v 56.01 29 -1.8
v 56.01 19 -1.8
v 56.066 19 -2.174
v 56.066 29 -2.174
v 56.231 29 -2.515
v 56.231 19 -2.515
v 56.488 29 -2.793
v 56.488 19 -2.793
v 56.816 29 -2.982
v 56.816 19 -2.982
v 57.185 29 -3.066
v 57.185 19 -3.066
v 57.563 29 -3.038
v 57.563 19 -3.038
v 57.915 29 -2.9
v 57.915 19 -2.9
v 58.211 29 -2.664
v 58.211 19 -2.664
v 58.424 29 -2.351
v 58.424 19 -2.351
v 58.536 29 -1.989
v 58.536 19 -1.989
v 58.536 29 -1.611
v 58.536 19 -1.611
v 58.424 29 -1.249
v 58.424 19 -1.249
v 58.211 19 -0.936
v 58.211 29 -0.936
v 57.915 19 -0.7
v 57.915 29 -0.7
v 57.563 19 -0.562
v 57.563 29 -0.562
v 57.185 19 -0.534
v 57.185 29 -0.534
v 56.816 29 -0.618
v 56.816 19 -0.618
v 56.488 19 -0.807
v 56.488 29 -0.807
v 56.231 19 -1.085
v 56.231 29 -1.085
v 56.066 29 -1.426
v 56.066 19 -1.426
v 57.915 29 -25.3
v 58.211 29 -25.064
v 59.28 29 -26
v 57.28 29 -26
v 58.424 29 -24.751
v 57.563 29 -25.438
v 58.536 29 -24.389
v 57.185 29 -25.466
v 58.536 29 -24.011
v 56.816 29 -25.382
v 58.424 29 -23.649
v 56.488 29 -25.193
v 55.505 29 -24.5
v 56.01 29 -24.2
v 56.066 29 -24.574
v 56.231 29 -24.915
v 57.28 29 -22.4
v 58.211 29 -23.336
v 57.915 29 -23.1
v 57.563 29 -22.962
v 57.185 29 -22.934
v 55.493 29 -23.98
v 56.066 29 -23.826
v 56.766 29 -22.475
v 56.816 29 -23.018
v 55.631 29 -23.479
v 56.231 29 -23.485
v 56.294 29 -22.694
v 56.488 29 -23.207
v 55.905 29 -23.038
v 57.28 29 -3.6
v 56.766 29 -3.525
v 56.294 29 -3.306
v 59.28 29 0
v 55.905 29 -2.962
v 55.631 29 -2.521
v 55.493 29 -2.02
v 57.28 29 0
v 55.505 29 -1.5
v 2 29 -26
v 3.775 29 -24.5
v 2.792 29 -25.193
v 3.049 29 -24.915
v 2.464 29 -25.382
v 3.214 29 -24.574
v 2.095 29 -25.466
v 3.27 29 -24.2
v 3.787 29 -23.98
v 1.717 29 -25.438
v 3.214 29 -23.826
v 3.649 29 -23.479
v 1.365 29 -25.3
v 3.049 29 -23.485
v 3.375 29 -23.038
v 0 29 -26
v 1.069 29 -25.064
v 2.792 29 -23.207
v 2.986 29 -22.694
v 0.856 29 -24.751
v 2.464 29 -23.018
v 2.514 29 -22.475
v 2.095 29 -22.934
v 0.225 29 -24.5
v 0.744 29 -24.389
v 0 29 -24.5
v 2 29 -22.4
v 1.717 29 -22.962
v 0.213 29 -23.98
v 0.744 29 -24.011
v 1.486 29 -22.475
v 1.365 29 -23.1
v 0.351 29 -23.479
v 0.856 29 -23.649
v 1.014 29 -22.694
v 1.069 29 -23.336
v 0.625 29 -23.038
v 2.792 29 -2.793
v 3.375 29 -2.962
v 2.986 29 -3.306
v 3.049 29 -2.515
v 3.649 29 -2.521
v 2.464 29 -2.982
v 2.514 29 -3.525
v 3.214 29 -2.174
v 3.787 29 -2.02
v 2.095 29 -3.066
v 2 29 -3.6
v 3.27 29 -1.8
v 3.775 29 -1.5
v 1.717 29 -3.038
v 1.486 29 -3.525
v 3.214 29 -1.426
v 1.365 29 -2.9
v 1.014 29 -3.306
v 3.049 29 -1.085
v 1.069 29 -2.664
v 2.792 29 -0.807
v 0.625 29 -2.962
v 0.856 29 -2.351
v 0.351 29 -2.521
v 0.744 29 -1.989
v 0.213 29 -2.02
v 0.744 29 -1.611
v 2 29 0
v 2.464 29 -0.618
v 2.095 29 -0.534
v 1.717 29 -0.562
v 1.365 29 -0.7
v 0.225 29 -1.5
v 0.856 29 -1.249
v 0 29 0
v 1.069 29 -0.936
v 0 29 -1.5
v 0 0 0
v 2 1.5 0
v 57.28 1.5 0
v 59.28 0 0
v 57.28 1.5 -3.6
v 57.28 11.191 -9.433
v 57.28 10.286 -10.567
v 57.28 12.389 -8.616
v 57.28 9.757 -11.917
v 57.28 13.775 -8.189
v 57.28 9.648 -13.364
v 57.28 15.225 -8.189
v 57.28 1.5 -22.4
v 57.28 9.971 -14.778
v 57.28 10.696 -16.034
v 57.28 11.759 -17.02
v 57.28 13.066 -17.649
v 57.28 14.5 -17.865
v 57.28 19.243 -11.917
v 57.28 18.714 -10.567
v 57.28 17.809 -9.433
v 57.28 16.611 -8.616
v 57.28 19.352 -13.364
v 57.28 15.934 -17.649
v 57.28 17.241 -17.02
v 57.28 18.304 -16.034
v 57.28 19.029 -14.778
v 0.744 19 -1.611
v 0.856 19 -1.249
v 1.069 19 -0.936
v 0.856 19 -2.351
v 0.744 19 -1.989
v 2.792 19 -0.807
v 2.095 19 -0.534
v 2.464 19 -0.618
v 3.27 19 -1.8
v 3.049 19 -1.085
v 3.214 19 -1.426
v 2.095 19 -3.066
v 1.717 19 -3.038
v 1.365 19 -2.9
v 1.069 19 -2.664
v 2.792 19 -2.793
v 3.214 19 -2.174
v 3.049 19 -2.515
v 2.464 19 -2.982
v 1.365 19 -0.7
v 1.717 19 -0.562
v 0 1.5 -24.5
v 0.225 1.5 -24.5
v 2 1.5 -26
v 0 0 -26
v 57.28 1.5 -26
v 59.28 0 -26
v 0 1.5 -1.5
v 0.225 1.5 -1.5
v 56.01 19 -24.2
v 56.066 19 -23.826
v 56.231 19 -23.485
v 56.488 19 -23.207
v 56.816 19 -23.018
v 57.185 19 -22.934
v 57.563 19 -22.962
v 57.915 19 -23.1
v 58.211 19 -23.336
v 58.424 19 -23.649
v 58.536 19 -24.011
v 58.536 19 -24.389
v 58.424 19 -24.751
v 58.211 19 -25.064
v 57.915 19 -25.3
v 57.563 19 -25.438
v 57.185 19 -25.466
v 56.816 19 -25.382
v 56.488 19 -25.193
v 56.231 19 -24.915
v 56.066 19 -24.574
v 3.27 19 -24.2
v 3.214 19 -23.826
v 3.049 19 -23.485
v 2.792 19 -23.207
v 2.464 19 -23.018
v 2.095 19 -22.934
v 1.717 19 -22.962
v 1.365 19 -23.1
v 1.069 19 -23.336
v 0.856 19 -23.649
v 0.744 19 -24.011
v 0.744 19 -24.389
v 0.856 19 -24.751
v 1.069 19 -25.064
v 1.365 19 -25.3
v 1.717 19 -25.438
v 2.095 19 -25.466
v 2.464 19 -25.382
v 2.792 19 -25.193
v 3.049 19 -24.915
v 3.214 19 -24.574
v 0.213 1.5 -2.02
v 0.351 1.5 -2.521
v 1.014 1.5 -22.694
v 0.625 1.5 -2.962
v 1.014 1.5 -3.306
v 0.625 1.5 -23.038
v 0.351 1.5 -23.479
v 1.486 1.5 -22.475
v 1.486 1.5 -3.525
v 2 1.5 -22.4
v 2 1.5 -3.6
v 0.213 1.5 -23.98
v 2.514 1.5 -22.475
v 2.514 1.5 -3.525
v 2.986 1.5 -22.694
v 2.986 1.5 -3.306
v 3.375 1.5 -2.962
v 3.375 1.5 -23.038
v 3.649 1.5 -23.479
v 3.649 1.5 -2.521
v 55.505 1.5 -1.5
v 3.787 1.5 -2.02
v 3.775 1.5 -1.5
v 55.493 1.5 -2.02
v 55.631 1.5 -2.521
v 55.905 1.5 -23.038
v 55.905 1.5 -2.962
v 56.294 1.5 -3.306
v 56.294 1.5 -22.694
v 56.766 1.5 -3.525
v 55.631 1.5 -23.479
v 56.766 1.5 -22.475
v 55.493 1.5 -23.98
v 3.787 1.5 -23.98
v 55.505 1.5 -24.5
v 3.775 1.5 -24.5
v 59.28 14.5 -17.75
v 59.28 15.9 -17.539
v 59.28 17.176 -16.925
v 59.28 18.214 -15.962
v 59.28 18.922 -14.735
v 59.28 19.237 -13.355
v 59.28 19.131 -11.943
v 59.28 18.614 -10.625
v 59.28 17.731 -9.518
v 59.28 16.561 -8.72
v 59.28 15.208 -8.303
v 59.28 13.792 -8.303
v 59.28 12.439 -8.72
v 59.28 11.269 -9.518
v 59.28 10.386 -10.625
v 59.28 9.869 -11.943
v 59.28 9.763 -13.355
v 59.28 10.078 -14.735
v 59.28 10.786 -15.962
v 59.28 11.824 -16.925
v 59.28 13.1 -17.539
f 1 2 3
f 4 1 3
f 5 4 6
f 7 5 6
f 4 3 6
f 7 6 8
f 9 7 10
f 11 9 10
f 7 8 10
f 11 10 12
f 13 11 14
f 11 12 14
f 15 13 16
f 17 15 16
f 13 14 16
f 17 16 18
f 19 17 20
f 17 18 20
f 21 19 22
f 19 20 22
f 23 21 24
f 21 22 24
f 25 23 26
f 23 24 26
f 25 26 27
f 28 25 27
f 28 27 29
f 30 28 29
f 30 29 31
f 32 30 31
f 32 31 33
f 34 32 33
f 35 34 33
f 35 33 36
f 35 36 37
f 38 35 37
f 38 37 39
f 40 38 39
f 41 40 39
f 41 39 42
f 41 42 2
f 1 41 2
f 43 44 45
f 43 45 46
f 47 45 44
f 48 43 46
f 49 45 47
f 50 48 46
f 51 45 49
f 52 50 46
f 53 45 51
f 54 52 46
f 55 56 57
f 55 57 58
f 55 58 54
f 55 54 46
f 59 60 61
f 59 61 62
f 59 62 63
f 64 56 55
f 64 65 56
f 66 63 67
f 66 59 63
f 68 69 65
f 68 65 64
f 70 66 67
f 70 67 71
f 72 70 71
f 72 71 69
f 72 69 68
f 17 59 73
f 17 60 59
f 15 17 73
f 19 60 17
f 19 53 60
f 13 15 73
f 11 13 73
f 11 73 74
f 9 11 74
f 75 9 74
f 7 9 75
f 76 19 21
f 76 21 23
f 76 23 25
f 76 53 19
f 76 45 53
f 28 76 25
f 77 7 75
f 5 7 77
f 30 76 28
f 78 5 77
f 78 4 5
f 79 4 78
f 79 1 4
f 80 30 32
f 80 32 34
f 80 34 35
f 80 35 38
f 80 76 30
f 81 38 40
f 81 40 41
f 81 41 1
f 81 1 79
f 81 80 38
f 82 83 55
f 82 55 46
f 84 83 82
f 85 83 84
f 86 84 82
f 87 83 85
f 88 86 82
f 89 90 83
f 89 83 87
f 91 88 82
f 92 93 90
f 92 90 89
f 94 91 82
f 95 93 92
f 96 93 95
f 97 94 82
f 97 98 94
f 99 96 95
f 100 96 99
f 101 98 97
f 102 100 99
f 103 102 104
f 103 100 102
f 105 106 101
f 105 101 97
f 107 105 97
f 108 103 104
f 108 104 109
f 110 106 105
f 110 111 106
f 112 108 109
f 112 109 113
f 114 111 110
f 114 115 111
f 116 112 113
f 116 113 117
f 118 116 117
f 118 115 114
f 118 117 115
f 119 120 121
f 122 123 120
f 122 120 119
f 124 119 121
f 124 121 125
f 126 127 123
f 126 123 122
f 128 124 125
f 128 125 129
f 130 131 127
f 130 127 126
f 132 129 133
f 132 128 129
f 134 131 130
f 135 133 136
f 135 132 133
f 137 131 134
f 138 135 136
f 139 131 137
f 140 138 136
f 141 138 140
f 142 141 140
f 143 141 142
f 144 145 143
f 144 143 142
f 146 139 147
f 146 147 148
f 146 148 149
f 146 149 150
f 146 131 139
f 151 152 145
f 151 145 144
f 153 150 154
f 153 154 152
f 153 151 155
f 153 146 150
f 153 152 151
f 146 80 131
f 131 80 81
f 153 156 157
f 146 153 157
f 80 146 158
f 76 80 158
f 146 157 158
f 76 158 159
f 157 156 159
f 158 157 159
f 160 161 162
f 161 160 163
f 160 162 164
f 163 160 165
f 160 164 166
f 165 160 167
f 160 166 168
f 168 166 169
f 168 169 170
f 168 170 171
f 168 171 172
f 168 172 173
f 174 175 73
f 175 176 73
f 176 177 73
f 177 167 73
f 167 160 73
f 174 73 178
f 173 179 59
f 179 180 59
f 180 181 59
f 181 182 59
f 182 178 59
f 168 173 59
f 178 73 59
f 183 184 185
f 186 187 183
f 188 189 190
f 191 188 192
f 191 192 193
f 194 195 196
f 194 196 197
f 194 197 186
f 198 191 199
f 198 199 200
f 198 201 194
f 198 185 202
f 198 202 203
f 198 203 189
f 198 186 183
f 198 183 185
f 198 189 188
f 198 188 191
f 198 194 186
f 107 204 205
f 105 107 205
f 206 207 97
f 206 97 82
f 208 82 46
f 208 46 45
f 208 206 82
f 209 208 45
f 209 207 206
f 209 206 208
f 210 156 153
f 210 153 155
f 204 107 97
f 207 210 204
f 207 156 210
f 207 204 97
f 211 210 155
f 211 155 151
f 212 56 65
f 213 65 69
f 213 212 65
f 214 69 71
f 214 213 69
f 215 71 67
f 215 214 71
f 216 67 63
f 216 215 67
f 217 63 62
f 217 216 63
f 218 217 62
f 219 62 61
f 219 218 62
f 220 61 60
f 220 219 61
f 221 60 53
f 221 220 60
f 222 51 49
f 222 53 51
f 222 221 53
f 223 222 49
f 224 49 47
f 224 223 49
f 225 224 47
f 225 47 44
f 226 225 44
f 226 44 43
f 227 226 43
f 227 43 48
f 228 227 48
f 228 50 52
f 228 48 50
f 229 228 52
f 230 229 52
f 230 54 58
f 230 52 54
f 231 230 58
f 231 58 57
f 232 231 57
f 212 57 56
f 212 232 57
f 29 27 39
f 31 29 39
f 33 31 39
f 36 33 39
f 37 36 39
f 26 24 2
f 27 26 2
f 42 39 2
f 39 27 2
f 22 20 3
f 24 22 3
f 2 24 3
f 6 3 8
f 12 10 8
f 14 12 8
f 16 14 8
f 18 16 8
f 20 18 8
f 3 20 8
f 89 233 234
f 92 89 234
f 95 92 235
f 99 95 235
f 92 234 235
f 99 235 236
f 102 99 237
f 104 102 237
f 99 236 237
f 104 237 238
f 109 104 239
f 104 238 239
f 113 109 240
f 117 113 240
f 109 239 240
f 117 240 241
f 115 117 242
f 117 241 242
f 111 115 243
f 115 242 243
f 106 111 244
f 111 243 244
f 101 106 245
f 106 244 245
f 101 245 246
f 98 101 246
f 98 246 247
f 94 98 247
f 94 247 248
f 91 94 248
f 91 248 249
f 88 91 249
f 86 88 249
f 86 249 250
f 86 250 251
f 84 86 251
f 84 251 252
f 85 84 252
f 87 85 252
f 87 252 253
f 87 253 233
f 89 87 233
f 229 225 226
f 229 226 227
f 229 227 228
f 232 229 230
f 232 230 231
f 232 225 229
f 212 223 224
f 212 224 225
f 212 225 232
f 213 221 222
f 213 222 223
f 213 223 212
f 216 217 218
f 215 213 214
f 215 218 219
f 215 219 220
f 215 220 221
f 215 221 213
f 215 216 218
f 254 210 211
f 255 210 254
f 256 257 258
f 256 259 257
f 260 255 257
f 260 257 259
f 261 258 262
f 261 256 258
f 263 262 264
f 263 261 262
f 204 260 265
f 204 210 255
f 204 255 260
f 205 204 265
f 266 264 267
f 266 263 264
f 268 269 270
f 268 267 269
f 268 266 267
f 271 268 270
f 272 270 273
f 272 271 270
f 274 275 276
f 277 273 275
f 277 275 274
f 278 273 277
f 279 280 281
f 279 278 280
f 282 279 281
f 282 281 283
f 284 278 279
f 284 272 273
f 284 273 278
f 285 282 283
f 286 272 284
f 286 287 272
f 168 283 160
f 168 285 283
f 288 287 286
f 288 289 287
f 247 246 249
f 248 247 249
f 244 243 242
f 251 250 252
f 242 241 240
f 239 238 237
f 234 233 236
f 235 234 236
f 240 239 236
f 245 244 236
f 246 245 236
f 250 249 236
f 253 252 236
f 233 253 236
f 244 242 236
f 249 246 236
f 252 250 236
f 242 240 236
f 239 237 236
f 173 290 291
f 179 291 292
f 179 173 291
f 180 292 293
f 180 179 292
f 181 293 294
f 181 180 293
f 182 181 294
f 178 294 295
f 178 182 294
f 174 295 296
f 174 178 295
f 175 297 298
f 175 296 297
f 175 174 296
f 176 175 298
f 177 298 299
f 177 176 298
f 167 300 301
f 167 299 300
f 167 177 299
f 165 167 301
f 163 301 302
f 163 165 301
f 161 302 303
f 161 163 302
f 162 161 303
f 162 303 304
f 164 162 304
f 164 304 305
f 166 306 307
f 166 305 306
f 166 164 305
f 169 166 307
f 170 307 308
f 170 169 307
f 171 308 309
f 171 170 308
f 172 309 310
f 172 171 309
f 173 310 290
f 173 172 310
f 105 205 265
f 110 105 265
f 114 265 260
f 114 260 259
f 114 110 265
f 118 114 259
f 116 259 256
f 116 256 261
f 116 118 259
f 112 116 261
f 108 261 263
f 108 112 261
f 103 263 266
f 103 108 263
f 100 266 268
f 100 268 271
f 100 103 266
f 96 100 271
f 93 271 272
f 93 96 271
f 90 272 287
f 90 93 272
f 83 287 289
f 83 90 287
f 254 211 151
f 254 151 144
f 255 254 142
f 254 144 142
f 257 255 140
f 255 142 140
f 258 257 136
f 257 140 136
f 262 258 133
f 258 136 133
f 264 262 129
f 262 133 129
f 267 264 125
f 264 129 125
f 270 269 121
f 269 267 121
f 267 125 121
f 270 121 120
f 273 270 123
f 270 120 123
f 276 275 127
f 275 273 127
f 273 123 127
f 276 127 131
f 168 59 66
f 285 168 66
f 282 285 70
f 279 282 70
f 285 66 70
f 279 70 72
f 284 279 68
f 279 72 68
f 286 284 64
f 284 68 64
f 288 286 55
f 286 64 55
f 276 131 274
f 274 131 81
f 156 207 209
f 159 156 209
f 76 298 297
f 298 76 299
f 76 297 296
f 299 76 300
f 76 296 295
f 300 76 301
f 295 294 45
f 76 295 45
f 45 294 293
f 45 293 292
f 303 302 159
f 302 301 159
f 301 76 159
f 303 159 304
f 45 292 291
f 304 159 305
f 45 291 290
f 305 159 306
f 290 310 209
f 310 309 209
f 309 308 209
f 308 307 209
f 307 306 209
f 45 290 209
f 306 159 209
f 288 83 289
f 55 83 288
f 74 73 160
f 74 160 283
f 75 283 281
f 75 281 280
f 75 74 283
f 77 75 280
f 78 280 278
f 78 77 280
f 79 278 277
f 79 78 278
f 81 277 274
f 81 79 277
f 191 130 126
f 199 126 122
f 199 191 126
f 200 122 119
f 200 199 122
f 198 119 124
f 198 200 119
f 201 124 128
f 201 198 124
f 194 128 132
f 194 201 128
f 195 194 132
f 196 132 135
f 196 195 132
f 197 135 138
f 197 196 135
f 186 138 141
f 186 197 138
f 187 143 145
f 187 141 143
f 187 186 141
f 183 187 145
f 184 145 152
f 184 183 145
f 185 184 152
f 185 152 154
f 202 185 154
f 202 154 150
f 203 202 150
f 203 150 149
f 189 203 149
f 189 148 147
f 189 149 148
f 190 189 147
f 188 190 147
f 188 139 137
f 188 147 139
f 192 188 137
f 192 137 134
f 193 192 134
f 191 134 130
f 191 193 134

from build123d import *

# Parameters (mm, degrees)
SKETCH1_W                 = 59.28
SKETCH1_H                 = 26
BOSS_EXTRUDE2_DEPTH       = 29
SKETCH3_W                 = 57.28
SKETCH3_H                 = 23
CUT_EXTRUDE1_DEPTH        = 27.5
SKETCH4_R                 = 4.75
SKETCH5_R                 = 4.8654
SKETCH9_R                 = 1.8
BOSS_EXTRUDE4_DEPTH       = 27.5
F_2_0MM_DOWEL_HOLE3_D     = 2.54
F_2_0MM_DOWEL_HOLE3_DEPTH = 10
MIRROR2_COPY_1_SKETCH_R   = 1.8
MIRROR2_COPY_1_DEPTH      = 27.5
MIRROR2_COPY_2_D          = 2.54
MIRROR2_COPY_2_DEPTH      = 10


with BuildPart() as part:
    # Sketch1 → Boss-Extrude2 (new body)
    with BuildSketch(Plane(origin=(0, 0, 0), x_dir=(1, 0, 0), z_dir=(0, 1, 0))):
        with Locations((29.64, 13)):
            Rectangle(SKETCH1_W, SKETCH1_H)
    extrude(amount=BOSS_EXTRUDE2_DEPTH)

    # Sketch3 → Cut-Extrude1 (cut)
    with BuildSketch(Plane(origin=(0, 29, 0), x_dir=(1, 0, 0), z_dir=(0, 1, 0))):
        with Locations((28.64, 13)):
            Rectangle(SKETCH3_W, SKETCH3_H)
    extrude(amount=-CUT_EXTRUDE1_DEPTH, mode=Mode.SUBTRACT)

    # Sketch4 → Cut-Loft1 section 0
    with BuildSketch(Plane(origin=(59.28, 0, 0), x_dir=(0, 0, -1), z_dir=(1, 0, 0))):
        with Locations((13, 14.5)):
            Circle(SKETCH4_R)
    # Sketch5 → Cut-Loft1 section 1
    with BuildSketch(Plane.ZY.offset(-57.28)):
        with Locations((-13, 14.5)):
            Circle(SKETCH5_R)
    loft(mode=Mode.SUBTRACT)

    # Sketch9 → Boss-Extrude4 (add)
    with BuildSketch(Plane(origin=(0, 29, 0), x_dir=(1, 0, 0), z_dir=(0, 1, 0))):
        with Locations((57.28, 1.8)):
            Circle(SKETCH9_R)
    boss_extrude4 = extrude(amount=-BOSS_EXTRUDE4_DEPTH)

    # Ø2.0mm Dowel Hole3
    with Locations(Plane(origin=(0, 29, 0), x_dir=(1, 0, 0), z_dir=(0, 1, 0))):
        with Locations((57.28, 1.8)):
            f_2_0mm_dowel_hole3 = Hole(F_2_0MM_DOWEL_HOLE3_D / 2, depth=F_2_0MM_DOWEL_HOLE3_DEPTH)

    # Mirror1: Boss-Extrude4, Ø2.0mm Dowel Hole3 across plane
    add(boss_extrude4.mirror(Plane(origin=(0, 0, -13), x_dir=(1, 0, 0), z_dir=(0, 0, -1))))
    add(f_2_0mm_dowel_hole3.mirror(Plane(origin=(0, 0, -13), x_dir=(1, 0, 0), z_dir=(0, 0, -1))), mode=Mode.SUBTRACT)

    # Mirror2: Boss-Extrude4, Ø2.0mm Dowel Hole3 across plane
    add(boss_extrude4.mirror(Plane.ZY.offset(-29.64)))
    add(f_2_0mm_dowel_hole3.mirror(Plane.ZY.offset(-29.64)), mode=Mode.SUBTRACT)

    # Mirror2 copy 1 sketch → Mirror2 copy 1 (add)
    with BuildSketch(Plane(origin=(59.28, 29, -26), x_dir=(-1, 0, 0), z_dir=(0, 1, 0))):
        with Locations((57.28, 1.8)):
            Circle(MIRROR2_COPY_1_SKETCH_R)
    extrude(amount=-MIRROR2_COPY_1_DEPTH)

    # Mirror2 copy 2
    with Locations(Plane(origin=(59.28, 29, -26), x_dir=(-1, 0, 0), z_dir=(0, 1, 0))):
        with Locations((57.28, 1.8)):
            Hole(MIRROR2_COPY_2_D / 2, depth=MIRROR2_COPY_2_DEPTH)


solid = part.part
